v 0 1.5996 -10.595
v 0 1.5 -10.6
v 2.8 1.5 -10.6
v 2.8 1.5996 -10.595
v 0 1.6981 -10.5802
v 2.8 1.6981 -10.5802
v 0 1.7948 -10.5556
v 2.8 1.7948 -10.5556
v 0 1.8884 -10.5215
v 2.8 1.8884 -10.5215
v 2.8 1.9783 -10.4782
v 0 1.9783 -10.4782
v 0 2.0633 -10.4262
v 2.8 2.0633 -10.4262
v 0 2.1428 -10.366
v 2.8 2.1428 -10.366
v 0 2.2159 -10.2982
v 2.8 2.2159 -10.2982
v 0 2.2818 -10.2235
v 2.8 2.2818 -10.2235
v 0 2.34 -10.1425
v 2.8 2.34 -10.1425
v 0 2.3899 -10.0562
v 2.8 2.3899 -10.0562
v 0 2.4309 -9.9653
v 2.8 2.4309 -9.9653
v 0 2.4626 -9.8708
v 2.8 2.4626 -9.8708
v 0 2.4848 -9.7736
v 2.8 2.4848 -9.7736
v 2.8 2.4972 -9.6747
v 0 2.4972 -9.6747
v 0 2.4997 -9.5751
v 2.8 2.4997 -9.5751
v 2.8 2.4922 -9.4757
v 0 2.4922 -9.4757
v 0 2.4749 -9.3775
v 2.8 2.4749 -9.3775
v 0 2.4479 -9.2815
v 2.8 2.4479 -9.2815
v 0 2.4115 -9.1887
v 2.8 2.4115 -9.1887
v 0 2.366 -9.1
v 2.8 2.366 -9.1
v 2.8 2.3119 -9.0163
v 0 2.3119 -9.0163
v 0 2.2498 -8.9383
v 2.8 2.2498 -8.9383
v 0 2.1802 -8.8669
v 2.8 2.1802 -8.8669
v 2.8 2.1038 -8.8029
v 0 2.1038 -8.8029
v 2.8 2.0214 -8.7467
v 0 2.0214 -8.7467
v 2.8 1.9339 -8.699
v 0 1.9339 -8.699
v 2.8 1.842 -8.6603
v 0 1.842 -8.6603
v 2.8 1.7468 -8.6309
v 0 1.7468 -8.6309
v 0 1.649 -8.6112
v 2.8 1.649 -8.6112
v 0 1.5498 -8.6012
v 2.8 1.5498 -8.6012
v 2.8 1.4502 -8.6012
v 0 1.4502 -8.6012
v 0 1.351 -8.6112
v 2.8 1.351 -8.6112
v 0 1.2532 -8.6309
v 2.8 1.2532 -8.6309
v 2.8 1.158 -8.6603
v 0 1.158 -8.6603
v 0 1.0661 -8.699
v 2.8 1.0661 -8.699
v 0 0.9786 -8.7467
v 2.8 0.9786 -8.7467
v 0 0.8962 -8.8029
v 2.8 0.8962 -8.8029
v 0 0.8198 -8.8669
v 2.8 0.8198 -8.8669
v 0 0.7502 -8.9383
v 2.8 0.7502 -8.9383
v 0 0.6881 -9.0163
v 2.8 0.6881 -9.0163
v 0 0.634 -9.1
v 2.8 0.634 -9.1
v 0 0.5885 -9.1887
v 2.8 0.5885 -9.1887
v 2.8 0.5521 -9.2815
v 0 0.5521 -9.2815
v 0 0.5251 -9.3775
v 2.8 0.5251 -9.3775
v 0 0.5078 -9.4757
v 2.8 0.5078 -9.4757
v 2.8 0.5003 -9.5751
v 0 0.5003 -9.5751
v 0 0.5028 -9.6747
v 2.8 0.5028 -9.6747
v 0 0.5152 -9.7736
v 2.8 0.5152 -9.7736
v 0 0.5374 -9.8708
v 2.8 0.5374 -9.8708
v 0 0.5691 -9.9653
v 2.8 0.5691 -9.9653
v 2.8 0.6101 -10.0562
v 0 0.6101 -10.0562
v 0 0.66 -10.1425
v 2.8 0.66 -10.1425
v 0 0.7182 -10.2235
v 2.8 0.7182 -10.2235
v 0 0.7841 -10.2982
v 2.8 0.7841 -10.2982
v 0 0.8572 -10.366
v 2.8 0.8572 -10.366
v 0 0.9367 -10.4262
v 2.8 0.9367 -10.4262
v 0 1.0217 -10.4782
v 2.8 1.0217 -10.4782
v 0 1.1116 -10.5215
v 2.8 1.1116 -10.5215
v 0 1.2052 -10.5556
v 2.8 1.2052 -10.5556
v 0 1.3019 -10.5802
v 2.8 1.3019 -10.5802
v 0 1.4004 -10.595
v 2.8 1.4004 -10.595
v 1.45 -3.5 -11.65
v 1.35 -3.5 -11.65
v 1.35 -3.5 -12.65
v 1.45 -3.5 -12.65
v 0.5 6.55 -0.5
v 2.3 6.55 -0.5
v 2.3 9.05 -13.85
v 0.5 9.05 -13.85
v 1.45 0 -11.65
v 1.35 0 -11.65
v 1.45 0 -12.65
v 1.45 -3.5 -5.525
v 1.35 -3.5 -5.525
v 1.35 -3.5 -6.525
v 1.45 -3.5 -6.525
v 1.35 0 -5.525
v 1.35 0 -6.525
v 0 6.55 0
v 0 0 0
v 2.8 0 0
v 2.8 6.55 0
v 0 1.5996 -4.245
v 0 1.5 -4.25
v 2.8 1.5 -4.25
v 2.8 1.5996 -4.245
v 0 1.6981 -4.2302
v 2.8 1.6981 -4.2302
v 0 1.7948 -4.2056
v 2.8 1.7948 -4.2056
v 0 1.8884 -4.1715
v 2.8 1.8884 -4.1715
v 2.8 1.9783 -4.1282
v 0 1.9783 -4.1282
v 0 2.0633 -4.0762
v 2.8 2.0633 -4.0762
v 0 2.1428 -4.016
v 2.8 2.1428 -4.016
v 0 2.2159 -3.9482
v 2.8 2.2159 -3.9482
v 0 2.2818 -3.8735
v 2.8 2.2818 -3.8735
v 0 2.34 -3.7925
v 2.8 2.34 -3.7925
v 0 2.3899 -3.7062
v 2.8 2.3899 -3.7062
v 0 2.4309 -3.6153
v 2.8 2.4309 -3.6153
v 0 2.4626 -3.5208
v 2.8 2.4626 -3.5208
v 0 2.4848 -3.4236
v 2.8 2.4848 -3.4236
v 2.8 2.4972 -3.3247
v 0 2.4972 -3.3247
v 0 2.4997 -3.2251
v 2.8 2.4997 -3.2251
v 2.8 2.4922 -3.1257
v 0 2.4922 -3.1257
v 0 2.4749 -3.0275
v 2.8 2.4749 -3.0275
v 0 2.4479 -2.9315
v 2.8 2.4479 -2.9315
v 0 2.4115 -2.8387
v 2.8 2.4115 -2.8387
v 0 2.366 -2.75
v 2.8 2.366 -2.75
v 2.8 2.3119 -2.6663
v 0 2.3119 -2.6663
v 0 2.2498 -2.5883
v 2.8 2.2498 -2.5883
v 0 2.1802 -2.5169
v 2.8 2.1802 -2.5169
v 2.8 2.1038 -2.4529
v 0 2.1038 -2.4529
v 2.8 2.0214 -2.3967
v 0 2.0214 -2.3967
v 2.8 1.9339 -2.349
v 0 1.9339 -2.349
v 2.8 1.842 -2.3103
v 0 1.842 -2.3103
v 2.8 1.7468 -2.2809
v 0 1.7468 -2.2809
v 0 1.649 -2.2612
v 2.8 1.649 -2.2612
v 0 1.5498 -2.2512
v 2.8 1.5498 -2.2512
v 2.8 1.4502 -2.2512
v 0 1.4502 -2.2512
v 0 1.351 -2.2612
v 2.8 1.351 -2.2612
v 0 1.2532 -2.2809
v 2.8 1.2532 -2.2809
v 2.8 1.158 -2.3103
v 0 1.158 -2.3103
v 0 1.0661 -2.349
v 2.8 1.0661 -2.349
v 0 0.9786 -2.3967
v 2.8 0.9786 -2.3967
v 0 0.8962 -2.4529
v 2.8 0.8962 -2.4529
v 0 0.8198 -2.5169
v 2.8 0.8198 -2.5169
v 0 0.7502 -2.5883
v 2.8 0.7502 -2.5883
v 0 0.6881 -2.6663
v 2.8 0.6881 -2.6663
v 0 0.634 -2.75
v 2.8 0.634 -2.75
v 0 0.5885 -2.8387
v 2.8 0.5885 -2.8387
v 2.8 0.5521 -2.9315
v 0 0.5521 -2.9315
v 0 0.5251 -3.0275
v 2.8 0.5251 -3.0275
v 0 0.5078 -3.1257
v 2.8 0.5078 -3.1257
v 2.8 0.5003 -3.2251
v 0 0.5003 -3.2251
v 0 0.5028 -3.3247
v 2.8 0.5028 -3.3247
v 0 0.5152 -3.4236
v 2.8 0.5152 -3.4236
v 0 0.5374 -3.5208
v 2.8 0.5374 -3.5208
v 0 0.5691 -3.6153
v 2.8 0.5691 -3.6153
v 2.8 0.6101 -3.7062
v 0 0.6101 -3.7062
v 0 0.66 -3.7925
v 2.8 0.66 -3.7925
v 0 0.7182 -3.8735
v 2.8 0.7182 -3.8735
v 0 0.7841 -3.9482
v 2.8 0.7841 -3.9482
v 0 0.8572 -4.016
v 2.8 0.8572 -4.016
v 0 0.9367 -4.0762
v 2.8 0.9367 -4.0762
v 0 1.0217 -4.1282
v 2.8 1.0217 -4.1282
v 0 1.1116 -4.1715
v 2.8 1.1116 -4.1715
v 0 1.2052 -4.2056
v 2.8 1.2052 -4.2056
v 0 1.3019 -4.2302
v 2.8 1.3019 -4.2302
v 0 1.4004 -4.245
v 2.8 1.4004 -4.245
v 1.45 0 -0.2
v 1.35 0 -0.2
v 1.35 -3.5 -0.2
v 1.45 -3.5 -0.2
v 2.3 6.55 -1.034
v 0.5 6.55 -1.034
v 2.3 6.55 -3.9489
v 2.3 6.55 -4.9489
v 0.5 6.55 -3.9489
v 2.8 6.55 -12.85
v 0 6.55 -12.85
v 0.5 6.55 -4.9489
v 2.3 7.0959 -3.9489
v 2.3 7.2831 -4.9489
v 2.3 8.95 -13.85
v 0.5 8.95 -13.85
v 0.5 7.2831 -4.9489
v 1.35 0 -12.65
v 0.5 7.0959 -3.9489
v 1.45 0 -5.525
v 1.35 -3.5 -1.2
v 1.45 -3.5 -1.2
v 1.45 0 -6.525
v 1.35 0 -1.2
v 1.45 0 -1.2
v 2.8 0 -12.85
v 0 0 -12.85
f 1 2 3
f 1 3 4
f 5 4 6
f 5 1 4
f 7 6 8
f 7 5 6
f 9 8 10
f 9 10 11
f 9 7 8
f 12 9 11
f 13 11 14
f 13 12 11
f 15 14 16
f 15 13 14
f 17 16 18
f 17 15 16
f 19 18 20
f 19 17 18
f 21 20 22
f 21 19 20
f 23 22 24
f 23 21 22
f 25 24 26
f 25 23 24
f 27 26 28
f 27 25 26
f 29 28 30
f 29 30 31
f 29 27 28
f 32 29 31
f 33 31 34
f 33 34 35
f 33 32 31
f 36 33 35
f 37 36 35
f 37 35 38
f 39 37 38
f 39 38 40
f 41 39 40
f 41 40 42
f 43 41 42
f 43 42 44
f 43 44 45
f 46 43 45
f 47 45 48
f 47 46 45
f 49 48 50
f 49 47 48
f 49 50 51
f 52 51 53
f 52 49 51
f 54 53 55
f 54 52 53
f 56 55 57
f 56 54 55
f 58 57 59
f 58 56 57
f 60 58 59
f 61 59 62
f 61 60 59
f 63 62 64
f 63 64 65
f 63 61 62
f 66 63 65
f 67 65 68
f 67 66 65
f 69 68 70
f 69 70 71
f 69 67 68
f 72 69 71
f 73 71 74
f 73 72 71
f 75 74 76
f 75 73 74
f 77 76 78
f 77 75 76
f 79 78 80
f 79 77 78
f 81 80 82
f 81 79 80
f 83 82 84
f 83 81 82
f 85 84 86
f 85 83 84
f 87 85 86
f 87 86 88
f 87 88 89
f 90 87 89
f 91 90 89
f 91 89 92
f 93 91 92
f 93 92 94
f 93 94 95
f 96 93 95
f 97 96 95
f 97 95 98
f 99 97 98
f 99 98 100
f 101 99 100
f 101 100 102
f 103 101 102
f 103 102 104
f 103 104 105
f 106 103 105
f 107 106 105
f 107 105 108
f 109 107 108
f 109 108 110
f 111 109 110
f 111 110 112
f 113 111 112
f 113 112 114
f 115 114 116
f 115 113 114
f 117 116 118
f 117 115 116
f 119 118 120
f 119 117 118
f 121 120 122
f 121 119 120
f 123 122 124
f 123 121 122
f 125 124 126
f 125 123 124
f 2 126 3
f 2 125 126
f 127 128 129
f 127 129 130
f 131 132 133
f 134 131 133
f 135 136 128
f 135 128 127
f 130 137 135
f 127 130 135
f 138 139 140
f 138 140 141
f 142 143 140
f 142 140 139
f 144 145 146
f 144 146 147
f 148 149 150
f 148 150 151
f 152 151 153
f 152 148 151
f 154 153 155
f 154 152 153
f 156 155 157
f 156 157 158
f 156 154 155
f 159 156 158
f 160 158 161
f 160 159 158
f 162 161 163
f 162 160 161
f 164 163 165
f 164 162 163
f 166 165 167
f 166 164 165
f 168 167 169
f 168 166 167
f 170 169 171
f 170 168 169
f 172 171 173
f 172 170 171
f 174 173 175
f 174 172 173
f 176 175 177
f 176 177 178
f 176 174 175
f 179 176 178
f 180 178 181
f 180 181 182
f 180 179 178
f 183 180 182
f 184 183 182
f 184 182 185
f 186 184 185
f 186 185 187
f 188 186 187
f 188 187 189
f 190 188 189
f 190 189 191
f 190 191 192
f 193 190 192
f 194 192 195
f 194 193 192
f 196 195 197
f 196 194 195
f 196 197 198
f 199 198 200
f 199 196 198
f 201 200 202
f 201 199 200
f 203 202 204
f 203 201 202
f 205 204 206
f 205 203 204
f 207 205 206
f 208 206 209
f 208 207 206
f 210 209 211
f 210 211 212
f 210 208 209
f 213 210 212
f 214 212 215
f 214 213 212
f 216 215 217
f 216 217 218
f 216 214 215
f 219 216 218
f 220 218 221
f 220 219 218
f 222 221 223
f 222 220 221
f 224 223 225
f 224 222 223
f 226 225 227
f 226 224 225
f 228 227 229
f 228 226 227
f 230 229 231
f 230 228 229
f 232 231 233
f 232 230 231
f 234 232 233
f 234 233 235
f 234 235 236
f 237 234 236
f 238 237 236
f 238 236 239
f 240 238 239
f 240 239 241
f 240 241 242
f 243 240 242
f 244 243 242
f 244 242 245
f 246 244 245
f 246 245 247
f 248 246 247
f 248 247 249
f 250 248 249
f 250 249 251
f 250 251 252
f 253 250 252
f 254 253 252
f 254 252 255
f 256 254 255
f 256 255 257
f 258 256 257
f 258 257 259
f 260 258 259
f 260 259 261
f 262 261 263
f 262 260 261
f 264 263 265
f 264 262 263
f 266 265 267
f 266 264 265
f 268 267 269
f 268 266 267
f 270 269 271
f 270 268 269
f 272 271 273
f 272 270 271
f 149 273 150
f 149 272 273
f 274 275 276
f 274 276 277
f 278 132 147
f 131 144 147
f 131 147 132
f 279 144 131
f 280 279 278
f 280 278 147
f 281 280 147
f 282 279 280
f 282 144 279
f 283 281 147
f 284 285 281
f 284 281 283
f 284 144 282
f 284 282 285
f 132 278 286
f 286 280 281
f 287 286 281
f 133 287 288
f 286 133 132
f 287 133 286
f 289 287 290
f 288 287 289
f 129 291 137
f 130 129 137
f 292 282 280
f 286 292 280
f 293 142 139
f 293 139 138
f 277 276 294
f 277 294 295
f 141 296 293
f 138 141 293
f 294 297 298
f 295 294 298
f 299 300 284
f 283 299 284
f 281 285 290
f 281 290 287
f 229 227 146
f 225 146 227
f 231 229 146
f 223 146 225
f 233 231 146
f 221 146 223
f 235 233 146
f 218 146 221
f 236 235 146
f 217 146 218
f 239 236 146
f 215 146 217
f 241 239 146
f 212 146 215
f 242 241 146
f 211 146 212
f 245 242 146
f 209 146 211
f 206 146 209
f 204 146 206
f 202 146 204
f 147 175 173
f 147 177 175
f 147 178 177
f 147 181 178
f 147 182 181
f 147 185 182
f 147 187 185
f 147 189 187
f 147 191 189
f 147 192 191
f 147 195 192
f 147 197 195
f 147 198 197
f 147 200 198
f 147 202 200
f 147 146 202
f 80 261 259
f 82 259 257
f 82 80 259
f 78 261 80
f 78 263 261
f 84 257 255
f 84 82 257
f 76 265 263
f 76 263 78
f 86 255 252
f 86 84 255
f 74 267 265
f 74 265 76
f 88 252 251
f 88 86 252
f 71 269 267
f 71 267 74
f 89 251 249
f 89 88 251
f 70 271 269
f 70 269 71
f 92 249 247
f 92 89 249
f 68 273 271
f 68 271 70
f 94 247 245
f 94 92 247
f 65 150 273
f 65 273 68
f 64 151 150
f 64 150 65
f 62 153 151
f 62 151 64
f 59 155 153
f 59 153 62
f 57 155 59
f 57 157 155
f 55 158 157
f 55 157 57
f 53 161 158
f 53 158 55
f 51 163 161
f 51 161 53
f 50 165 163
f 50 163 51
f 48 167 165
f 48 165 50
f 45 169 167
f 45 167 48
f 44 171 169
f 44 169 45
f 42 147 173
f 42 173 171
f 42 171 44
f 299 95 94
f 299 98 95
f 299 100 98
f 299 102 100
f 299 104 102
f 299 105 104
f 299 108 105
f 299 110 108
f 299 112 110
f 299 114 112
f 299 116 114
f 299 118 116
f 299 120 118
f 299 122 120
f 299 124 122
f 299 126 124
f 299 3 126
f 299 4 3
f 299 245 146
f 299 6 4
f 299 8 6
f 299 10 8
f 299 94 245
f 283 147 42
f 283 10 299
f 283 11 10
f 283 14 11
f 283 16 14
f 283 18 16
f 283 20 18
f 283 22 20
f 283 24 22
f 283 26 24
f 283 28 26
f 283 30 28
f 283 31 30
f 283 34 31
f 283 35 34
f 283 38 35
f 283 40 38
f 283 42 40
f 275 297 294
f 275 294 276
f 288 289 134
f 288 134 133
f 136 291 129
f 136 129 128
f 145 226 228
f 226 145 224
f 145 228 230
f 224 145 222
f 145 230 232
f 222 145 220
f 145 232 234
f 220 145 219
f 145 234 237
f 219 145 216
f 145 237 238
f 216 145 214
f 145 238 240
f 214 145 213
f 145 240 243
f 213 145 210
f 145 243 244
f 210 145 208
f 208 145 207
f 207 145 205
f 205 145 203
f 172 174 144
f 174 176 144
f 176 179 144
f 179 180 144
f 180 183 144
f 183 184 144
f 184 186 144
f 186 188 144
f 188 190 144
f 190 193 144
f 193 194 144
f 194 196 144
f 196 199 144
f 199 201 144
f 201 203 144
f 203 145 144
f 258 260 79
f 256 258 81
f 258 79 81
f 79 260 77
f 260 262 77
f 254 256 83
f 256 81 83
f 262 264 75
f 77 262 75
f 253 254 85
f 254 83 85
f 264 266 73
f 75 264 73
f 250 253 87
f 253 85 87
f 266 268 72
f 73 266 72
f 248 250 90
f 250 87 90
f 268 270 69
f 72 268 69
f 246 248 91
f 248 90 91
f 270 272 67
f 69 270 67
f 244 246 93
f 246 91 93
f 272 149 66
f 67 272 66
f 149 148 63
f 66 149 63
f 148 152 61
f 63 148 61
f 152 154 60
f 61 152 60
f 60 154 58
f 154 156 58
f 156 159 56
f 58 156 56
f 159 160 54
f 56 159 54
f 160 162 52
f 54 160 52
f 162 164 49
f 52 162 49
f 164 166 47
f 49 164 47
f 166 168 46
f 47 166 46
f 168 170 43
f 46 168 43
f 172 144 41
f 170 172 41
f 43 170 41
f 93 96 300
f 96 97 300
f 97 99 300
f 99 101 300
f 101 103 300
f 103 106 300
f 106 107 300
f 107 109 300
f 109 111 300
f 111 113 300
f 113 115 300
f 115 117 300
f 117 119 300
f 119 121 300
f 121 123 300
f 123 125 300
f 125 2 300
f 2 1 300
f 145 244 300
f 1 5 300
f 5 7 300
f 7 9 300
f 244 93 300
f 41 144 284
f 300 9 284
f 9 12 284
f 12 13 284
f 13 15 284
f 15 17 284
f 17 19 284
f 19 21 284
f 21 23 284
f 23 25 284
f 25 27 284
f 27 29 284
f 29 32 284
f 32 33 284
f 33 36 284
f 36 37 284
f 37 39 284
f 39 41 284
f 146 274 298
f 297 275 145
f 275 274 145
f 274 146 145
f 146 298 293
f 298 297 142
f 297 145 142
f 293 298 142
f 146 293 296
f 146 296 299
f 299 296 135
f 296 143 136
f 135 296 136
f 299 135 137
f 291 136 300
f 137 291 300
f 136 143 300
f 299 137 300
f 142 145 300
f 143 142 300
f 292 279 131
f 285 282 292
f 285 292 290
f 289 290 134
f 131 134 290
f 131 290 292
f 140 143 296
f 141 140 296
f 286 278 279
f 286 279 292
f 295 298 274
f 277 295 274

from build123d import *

# Parameters (mm, degrees)
BODYSKETCH1_W                = 12.85
BODYSKETCH1_H                = 6.55
BODYSKETCH1_R                = 1
BODYBOSS_EXTRUDE1_DEPTH      = 2.8
SKETCH2_W                    = 1.8
SKETCH2_H                    = 13.35
LEVERBOSS_EXTRUDE2_DEPTH     = 2.5
LEVERCUT_EXTRUDE1_DEPTH      = 17.703742096
BUTTONBOSS_EXTRUDE3_REACH    = 17.574
SKETCH4_W                    = 1.8
SKETCH4_H                    = 1
SKETCH5_W                    = 0.1
SKETCH5_H                    = 1
TEREMINALBOSS_EXTRUDE4_DEPTH = 3.5


with BuildPart() as part:
    # BodySketch1 → BodyBoss-Extrude1 (new body)
    with BuildSketch(Plane(origin=(0, 0, 0), x_dir=(0, 0, -1), z_dir=(1, 0, 0))):
        with Locations((6.425, 3.275)):
            Rectangle(BODYSKETCH1_W, BODYSKETCH1_H)
        with Locations((3.25, 1.5)):
            Circle(BODYSKETCH1_R, mode=Mode.SUBTRACT)
        with Locations((9.6, 1.5)):
            Circle(BODYSKETCH1_R, mode=Mode.SUBTRACT)
    extrude(amount=BODYBOSS_EXTRUDE1_DEPTH)

    # Sketch2 → LeverBoss-Extrude2 (add)
    with BuildSketch(Plane(origin=(0, 6.55, 0), x_dir=(1, 0, 0), z_dir=(0, 1, 0))):
        with Locations((1.4, 7.175)):
            Rectangle(SKETCH2_W, SKETCH2_H)
    extrude(amount=LEVERBOSS_EXTRUDE2_DEPTH)

    # Sketch3 → LeverCut-Extrude1 (cut, through all)
    with BuildSketch(Plane(origin=(2.3, 0, 0), x_dir=(0, 0, -1), z_dir=(1, 0, 0))):
        Polygon((0.5, 6.55), (13.85, 9.05), (0.5, 9.05), align=None)
        Polygon((13.85, 8.95), (13.85, 6.55), (1.034, 6.55), align=None)
    extrude(amount=-LEVERCUT_EXTRUDE1_DEPTH, mode=Mode.SUBTRACT)

    # ButtonBoss-Extrude3: up to this plane
    buttonboss_extrude3_end = Plane(origin=(0, 6.55, -1.034), z_dir=(0, 0.982913837182172, 0.1840662616446014))
    # Sketch4 → ButtonBoss-Extrude3 (add, up to the surface)
    with BuildSketch(Plane(origin=(0, 6.55, 0), x_dir=(1, 0, 0), z_dir=(0, 1, 0)), mode=Mode.PRIVATE) as buttonboss_extrude3_sk1:
        with Locations((1.4, 4.448948019)):
            Rectangle(SKETCH4_W, SKETCH4_H)
    buttonboss_extrude3_tool1 = split(extrude(buttonboss_extrude3_sk1.sketch, amount=BUTTONBOSS_EXTRUDE3_REACH, mode=Mode.PRIVATE), bisect_by=buttonboss_extrude3_end, keep=Keep.BOTH, mode=Mode.PRIVATE)
    add(buttonboss_extrude3_tool1.solids().sort_by_distance((1.4, 6.55, -4.448948))[0])

    # Sketch5 → TereminalBoss-Extrude4 (add)
    with BuildSketch(Plane.XZ):
        with Locations((1.4, -0.7)):
            Rectangle(SKETCH5_W, SKETCH5_H)
        with Locations((1.4, -6.025)):
            Rectangle(SKETCH5_W, SKETCH5_H)
        with Locations((1.4, -12.15)):
            Rectangle(SKETCH5_W, SKETCH5_H)
    extrude(amount=TEREMINALBOSS_EXTRUDE4_DEPTH)


solid = part.part
